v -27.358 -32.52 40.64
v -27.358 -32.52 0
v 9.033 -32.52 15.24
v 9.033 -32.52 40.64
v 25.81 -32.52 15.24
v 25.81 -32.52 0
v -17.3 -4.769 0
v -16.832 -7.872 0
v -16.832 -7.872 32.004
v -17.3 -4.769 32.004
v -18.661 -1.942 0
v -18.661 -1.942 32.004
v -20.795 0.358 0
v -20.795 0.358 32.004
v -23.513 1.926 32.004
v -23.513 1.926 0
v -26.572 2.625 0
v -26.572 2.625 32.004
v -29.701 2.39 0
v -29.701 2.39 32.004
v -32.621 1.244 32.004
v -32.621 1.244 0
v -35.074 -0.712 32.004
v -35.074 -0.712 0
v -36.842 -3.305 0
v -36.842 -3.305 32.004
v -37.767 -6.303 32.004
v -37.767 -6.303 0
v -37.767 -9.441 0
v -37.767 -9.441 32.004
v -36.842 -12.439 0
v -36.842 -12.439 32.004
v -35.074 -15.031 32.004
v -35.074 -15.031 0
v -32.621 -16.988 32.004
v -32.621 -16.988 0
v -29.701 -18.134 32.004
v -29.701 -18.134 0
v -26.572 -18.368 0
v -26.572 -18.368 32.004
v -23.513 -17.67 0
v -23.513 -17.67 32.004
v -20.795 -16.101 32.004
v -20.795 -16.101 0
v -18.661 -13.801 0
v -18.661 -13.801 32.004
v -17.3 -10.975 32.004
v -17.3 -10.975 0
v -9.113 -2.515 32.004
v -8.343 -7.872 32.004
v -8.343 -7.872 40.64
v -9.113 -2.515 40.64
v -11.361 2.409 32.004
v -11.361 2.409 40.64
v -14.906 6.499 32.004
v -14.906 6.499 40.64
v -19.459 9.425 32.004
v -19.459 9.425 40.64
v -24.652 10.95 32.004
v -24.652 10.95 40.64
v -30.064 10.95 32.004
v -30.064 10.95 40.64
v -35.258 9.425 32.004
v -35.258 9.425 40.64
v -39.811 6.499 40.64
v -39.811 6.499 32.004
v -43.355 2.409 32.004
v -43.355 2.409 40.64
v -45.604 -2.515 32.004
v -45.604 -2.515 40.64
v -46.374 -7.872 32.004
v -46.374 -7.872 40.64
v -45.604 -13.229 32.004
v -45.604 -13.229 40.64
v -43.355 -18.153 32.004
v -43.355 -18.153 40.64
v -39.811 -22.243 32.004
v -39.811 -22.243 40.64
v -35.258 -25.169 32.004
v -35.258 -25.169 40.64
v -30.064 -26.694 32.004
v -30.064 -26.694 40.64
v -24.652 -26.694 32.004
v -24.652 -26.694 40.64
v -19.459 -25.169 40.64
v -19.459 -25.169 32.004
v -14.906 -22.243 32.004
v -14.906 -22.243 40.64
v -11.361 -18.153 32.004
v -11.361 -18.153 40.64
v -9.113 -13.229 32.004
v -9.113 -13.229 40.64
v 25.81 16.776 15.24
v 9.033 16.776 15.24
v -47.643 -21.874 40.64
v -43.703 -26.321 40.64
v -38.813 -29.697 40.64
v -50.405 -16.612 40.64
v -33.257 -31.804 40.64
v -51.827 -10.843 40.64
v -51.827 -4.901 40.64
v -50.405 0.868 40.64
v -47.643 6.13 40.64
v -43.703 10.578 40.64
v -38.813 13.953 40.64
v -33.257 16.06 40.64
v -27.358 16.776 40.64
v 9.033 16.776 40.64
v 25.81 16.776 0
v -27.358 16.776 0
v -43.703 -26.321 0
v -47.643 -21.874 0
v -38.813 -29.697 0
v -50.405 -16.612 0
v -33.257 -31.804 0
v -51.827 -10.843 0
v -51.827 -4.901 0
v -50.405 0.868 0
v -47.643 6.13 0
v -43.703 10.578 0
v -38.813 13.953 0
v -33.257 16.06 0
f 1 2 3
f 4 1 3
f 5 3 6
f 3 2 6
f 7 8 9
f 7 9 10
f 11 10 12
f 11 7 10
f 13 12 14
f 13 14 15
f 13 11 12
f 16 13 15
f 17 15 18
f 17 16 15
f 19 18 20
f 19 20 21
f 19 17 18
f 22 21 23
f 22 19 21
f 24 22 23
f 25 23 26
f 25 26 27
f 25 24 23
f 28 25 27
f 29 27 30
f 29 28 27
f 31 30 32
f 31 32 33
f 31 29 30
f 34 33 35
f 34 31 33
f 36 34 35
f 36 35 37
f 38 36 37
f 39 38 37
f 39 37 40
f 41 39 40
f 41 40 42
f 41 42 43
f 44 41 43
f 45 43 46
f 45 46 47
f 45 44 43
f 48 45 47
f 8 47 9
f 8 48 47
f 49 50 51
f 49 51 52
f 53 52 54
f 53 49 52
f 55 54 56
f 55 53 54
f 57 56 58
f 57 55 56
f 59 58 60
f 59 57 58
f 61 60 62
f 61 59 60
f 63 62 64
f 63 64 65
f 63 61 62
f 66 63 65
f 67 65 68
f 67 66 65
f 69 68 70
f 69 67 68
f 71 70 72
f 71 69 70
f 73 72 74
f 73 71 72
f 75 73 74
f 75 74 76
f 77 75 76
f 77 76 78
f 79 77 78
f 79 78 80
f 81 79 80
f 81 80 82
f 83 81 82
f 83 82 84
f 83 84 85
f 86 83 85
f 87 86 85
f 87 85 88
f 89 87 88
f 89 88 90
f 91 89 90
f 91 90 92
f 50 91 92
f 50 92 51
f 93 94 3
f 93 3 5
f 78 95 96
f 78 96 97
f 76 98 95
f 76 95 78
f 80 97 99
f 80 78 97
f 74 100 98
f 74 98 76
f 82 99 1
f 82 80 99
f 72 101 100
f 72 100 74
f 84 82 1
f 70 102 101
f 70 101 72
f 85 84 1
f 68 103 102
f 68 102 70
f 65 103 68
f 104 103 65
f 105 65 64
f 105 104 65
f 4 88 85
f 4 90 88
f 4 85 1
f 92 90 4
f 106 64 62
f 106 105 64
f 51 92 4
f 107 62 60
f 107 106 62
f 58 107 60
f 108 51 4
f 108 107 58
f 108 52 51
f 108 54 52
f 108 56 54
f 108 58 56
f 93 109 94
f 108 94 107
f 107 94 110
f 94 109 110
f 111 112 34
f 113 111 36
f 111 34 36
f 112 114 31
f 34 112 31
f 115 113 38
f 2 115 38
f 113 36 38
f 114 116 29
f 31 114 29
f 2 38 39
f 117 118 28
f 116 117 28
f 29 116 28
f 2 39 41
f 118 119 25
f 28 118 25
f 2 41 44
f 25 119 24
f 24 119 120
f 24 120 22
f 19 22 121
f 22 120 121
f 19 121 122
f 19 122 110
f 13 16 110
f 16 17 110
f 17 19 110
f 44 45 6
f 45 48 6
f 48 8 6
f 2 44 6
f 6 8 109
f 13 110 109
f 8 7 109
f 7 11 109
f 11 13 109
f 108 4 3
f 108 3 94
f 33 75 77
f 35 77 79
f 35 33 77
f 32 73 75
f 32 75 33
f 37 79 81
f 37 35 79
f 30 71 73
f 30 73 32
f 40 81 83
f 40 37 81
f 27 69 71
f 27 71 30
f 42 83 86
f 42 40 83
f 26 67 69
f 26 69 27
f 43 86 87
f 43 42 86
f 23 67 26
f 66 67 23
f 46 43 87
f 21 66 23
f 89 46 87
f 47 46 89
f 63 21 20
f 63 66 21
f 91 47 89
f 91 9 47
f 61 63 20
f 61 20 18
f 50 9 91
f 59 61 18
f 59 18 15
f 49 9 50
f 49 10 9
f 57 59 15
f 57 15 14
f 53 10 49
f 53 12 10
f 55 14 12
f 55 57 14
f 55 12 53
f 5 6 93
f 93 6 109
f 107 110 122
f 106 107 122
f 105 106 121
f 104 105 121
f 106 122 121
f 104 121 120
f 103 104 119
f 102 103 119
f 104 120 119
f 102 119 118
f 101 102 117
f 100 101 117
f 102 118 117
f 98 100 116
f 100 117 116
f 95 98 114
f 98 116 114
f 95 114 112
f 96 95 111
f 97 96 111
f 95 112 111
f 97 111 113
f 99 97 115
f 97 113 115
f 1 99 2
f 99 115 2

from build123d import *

# Parameters (mm, degrees)
F0_R     = 19.0157086471
F1_DEPTH = 40.64
F0_R_2   = 10.5259508952
F2_DEPTH = 32.004
F3_W     = 16.7762897909
F3_H     = 49.2964833975
F4_DEPTH = 25.4


with BuildPart() as f1:
    # F0 (on Top) → F1 (new body)
    with BuildSketch(Plane.XY):
        with BuildLine():
            Line((25.8096773177, -32.5201936066), (25.8096773177, 16.7762897909))
            Line((25.8096773177, 16.7762897909), (-27.3582581431, 16.7762897909))
            ThreePointArc((-27.3582581431, 16.7762897909), (-52.0064998418, -7.8719519079), (-27.3582581431, -32.5201936066))
            Line((-27.3582581431, -32.5201936066), (25.8096773177, -32.5201936066))
        make_face()
        with Locations((-27.3582581431, -7.8719519079)):
            Circle(F0_R, mode=Mode.SUBTRACT)
    extrude(amount=F1_DEPTH)

    # F0 (on Top) → F2 (join)
    with BuildSketch(Plane.XY):
        with Locations((-27.3582581431, -7.8719519079)):
            Circle(F0_R)
        with Locations((-27.3582581431, -7.8719519079)):
            Circle(F0_R_2, mode=Mode.SUBTRACT)
    extrude(amount=F2_DEPTH)

    # F3 (on face) → F4 (cut)
    with BuildSketch(Plane.XY.offset(40.64)):
        with Locations((17.4215324223, -7.8719519079)):
            Rectangle(F3_W, F3_H)
    extrude(amount=-F4_DEPTH, mode=Mode.SUBTRACT)


solid = f1.part
